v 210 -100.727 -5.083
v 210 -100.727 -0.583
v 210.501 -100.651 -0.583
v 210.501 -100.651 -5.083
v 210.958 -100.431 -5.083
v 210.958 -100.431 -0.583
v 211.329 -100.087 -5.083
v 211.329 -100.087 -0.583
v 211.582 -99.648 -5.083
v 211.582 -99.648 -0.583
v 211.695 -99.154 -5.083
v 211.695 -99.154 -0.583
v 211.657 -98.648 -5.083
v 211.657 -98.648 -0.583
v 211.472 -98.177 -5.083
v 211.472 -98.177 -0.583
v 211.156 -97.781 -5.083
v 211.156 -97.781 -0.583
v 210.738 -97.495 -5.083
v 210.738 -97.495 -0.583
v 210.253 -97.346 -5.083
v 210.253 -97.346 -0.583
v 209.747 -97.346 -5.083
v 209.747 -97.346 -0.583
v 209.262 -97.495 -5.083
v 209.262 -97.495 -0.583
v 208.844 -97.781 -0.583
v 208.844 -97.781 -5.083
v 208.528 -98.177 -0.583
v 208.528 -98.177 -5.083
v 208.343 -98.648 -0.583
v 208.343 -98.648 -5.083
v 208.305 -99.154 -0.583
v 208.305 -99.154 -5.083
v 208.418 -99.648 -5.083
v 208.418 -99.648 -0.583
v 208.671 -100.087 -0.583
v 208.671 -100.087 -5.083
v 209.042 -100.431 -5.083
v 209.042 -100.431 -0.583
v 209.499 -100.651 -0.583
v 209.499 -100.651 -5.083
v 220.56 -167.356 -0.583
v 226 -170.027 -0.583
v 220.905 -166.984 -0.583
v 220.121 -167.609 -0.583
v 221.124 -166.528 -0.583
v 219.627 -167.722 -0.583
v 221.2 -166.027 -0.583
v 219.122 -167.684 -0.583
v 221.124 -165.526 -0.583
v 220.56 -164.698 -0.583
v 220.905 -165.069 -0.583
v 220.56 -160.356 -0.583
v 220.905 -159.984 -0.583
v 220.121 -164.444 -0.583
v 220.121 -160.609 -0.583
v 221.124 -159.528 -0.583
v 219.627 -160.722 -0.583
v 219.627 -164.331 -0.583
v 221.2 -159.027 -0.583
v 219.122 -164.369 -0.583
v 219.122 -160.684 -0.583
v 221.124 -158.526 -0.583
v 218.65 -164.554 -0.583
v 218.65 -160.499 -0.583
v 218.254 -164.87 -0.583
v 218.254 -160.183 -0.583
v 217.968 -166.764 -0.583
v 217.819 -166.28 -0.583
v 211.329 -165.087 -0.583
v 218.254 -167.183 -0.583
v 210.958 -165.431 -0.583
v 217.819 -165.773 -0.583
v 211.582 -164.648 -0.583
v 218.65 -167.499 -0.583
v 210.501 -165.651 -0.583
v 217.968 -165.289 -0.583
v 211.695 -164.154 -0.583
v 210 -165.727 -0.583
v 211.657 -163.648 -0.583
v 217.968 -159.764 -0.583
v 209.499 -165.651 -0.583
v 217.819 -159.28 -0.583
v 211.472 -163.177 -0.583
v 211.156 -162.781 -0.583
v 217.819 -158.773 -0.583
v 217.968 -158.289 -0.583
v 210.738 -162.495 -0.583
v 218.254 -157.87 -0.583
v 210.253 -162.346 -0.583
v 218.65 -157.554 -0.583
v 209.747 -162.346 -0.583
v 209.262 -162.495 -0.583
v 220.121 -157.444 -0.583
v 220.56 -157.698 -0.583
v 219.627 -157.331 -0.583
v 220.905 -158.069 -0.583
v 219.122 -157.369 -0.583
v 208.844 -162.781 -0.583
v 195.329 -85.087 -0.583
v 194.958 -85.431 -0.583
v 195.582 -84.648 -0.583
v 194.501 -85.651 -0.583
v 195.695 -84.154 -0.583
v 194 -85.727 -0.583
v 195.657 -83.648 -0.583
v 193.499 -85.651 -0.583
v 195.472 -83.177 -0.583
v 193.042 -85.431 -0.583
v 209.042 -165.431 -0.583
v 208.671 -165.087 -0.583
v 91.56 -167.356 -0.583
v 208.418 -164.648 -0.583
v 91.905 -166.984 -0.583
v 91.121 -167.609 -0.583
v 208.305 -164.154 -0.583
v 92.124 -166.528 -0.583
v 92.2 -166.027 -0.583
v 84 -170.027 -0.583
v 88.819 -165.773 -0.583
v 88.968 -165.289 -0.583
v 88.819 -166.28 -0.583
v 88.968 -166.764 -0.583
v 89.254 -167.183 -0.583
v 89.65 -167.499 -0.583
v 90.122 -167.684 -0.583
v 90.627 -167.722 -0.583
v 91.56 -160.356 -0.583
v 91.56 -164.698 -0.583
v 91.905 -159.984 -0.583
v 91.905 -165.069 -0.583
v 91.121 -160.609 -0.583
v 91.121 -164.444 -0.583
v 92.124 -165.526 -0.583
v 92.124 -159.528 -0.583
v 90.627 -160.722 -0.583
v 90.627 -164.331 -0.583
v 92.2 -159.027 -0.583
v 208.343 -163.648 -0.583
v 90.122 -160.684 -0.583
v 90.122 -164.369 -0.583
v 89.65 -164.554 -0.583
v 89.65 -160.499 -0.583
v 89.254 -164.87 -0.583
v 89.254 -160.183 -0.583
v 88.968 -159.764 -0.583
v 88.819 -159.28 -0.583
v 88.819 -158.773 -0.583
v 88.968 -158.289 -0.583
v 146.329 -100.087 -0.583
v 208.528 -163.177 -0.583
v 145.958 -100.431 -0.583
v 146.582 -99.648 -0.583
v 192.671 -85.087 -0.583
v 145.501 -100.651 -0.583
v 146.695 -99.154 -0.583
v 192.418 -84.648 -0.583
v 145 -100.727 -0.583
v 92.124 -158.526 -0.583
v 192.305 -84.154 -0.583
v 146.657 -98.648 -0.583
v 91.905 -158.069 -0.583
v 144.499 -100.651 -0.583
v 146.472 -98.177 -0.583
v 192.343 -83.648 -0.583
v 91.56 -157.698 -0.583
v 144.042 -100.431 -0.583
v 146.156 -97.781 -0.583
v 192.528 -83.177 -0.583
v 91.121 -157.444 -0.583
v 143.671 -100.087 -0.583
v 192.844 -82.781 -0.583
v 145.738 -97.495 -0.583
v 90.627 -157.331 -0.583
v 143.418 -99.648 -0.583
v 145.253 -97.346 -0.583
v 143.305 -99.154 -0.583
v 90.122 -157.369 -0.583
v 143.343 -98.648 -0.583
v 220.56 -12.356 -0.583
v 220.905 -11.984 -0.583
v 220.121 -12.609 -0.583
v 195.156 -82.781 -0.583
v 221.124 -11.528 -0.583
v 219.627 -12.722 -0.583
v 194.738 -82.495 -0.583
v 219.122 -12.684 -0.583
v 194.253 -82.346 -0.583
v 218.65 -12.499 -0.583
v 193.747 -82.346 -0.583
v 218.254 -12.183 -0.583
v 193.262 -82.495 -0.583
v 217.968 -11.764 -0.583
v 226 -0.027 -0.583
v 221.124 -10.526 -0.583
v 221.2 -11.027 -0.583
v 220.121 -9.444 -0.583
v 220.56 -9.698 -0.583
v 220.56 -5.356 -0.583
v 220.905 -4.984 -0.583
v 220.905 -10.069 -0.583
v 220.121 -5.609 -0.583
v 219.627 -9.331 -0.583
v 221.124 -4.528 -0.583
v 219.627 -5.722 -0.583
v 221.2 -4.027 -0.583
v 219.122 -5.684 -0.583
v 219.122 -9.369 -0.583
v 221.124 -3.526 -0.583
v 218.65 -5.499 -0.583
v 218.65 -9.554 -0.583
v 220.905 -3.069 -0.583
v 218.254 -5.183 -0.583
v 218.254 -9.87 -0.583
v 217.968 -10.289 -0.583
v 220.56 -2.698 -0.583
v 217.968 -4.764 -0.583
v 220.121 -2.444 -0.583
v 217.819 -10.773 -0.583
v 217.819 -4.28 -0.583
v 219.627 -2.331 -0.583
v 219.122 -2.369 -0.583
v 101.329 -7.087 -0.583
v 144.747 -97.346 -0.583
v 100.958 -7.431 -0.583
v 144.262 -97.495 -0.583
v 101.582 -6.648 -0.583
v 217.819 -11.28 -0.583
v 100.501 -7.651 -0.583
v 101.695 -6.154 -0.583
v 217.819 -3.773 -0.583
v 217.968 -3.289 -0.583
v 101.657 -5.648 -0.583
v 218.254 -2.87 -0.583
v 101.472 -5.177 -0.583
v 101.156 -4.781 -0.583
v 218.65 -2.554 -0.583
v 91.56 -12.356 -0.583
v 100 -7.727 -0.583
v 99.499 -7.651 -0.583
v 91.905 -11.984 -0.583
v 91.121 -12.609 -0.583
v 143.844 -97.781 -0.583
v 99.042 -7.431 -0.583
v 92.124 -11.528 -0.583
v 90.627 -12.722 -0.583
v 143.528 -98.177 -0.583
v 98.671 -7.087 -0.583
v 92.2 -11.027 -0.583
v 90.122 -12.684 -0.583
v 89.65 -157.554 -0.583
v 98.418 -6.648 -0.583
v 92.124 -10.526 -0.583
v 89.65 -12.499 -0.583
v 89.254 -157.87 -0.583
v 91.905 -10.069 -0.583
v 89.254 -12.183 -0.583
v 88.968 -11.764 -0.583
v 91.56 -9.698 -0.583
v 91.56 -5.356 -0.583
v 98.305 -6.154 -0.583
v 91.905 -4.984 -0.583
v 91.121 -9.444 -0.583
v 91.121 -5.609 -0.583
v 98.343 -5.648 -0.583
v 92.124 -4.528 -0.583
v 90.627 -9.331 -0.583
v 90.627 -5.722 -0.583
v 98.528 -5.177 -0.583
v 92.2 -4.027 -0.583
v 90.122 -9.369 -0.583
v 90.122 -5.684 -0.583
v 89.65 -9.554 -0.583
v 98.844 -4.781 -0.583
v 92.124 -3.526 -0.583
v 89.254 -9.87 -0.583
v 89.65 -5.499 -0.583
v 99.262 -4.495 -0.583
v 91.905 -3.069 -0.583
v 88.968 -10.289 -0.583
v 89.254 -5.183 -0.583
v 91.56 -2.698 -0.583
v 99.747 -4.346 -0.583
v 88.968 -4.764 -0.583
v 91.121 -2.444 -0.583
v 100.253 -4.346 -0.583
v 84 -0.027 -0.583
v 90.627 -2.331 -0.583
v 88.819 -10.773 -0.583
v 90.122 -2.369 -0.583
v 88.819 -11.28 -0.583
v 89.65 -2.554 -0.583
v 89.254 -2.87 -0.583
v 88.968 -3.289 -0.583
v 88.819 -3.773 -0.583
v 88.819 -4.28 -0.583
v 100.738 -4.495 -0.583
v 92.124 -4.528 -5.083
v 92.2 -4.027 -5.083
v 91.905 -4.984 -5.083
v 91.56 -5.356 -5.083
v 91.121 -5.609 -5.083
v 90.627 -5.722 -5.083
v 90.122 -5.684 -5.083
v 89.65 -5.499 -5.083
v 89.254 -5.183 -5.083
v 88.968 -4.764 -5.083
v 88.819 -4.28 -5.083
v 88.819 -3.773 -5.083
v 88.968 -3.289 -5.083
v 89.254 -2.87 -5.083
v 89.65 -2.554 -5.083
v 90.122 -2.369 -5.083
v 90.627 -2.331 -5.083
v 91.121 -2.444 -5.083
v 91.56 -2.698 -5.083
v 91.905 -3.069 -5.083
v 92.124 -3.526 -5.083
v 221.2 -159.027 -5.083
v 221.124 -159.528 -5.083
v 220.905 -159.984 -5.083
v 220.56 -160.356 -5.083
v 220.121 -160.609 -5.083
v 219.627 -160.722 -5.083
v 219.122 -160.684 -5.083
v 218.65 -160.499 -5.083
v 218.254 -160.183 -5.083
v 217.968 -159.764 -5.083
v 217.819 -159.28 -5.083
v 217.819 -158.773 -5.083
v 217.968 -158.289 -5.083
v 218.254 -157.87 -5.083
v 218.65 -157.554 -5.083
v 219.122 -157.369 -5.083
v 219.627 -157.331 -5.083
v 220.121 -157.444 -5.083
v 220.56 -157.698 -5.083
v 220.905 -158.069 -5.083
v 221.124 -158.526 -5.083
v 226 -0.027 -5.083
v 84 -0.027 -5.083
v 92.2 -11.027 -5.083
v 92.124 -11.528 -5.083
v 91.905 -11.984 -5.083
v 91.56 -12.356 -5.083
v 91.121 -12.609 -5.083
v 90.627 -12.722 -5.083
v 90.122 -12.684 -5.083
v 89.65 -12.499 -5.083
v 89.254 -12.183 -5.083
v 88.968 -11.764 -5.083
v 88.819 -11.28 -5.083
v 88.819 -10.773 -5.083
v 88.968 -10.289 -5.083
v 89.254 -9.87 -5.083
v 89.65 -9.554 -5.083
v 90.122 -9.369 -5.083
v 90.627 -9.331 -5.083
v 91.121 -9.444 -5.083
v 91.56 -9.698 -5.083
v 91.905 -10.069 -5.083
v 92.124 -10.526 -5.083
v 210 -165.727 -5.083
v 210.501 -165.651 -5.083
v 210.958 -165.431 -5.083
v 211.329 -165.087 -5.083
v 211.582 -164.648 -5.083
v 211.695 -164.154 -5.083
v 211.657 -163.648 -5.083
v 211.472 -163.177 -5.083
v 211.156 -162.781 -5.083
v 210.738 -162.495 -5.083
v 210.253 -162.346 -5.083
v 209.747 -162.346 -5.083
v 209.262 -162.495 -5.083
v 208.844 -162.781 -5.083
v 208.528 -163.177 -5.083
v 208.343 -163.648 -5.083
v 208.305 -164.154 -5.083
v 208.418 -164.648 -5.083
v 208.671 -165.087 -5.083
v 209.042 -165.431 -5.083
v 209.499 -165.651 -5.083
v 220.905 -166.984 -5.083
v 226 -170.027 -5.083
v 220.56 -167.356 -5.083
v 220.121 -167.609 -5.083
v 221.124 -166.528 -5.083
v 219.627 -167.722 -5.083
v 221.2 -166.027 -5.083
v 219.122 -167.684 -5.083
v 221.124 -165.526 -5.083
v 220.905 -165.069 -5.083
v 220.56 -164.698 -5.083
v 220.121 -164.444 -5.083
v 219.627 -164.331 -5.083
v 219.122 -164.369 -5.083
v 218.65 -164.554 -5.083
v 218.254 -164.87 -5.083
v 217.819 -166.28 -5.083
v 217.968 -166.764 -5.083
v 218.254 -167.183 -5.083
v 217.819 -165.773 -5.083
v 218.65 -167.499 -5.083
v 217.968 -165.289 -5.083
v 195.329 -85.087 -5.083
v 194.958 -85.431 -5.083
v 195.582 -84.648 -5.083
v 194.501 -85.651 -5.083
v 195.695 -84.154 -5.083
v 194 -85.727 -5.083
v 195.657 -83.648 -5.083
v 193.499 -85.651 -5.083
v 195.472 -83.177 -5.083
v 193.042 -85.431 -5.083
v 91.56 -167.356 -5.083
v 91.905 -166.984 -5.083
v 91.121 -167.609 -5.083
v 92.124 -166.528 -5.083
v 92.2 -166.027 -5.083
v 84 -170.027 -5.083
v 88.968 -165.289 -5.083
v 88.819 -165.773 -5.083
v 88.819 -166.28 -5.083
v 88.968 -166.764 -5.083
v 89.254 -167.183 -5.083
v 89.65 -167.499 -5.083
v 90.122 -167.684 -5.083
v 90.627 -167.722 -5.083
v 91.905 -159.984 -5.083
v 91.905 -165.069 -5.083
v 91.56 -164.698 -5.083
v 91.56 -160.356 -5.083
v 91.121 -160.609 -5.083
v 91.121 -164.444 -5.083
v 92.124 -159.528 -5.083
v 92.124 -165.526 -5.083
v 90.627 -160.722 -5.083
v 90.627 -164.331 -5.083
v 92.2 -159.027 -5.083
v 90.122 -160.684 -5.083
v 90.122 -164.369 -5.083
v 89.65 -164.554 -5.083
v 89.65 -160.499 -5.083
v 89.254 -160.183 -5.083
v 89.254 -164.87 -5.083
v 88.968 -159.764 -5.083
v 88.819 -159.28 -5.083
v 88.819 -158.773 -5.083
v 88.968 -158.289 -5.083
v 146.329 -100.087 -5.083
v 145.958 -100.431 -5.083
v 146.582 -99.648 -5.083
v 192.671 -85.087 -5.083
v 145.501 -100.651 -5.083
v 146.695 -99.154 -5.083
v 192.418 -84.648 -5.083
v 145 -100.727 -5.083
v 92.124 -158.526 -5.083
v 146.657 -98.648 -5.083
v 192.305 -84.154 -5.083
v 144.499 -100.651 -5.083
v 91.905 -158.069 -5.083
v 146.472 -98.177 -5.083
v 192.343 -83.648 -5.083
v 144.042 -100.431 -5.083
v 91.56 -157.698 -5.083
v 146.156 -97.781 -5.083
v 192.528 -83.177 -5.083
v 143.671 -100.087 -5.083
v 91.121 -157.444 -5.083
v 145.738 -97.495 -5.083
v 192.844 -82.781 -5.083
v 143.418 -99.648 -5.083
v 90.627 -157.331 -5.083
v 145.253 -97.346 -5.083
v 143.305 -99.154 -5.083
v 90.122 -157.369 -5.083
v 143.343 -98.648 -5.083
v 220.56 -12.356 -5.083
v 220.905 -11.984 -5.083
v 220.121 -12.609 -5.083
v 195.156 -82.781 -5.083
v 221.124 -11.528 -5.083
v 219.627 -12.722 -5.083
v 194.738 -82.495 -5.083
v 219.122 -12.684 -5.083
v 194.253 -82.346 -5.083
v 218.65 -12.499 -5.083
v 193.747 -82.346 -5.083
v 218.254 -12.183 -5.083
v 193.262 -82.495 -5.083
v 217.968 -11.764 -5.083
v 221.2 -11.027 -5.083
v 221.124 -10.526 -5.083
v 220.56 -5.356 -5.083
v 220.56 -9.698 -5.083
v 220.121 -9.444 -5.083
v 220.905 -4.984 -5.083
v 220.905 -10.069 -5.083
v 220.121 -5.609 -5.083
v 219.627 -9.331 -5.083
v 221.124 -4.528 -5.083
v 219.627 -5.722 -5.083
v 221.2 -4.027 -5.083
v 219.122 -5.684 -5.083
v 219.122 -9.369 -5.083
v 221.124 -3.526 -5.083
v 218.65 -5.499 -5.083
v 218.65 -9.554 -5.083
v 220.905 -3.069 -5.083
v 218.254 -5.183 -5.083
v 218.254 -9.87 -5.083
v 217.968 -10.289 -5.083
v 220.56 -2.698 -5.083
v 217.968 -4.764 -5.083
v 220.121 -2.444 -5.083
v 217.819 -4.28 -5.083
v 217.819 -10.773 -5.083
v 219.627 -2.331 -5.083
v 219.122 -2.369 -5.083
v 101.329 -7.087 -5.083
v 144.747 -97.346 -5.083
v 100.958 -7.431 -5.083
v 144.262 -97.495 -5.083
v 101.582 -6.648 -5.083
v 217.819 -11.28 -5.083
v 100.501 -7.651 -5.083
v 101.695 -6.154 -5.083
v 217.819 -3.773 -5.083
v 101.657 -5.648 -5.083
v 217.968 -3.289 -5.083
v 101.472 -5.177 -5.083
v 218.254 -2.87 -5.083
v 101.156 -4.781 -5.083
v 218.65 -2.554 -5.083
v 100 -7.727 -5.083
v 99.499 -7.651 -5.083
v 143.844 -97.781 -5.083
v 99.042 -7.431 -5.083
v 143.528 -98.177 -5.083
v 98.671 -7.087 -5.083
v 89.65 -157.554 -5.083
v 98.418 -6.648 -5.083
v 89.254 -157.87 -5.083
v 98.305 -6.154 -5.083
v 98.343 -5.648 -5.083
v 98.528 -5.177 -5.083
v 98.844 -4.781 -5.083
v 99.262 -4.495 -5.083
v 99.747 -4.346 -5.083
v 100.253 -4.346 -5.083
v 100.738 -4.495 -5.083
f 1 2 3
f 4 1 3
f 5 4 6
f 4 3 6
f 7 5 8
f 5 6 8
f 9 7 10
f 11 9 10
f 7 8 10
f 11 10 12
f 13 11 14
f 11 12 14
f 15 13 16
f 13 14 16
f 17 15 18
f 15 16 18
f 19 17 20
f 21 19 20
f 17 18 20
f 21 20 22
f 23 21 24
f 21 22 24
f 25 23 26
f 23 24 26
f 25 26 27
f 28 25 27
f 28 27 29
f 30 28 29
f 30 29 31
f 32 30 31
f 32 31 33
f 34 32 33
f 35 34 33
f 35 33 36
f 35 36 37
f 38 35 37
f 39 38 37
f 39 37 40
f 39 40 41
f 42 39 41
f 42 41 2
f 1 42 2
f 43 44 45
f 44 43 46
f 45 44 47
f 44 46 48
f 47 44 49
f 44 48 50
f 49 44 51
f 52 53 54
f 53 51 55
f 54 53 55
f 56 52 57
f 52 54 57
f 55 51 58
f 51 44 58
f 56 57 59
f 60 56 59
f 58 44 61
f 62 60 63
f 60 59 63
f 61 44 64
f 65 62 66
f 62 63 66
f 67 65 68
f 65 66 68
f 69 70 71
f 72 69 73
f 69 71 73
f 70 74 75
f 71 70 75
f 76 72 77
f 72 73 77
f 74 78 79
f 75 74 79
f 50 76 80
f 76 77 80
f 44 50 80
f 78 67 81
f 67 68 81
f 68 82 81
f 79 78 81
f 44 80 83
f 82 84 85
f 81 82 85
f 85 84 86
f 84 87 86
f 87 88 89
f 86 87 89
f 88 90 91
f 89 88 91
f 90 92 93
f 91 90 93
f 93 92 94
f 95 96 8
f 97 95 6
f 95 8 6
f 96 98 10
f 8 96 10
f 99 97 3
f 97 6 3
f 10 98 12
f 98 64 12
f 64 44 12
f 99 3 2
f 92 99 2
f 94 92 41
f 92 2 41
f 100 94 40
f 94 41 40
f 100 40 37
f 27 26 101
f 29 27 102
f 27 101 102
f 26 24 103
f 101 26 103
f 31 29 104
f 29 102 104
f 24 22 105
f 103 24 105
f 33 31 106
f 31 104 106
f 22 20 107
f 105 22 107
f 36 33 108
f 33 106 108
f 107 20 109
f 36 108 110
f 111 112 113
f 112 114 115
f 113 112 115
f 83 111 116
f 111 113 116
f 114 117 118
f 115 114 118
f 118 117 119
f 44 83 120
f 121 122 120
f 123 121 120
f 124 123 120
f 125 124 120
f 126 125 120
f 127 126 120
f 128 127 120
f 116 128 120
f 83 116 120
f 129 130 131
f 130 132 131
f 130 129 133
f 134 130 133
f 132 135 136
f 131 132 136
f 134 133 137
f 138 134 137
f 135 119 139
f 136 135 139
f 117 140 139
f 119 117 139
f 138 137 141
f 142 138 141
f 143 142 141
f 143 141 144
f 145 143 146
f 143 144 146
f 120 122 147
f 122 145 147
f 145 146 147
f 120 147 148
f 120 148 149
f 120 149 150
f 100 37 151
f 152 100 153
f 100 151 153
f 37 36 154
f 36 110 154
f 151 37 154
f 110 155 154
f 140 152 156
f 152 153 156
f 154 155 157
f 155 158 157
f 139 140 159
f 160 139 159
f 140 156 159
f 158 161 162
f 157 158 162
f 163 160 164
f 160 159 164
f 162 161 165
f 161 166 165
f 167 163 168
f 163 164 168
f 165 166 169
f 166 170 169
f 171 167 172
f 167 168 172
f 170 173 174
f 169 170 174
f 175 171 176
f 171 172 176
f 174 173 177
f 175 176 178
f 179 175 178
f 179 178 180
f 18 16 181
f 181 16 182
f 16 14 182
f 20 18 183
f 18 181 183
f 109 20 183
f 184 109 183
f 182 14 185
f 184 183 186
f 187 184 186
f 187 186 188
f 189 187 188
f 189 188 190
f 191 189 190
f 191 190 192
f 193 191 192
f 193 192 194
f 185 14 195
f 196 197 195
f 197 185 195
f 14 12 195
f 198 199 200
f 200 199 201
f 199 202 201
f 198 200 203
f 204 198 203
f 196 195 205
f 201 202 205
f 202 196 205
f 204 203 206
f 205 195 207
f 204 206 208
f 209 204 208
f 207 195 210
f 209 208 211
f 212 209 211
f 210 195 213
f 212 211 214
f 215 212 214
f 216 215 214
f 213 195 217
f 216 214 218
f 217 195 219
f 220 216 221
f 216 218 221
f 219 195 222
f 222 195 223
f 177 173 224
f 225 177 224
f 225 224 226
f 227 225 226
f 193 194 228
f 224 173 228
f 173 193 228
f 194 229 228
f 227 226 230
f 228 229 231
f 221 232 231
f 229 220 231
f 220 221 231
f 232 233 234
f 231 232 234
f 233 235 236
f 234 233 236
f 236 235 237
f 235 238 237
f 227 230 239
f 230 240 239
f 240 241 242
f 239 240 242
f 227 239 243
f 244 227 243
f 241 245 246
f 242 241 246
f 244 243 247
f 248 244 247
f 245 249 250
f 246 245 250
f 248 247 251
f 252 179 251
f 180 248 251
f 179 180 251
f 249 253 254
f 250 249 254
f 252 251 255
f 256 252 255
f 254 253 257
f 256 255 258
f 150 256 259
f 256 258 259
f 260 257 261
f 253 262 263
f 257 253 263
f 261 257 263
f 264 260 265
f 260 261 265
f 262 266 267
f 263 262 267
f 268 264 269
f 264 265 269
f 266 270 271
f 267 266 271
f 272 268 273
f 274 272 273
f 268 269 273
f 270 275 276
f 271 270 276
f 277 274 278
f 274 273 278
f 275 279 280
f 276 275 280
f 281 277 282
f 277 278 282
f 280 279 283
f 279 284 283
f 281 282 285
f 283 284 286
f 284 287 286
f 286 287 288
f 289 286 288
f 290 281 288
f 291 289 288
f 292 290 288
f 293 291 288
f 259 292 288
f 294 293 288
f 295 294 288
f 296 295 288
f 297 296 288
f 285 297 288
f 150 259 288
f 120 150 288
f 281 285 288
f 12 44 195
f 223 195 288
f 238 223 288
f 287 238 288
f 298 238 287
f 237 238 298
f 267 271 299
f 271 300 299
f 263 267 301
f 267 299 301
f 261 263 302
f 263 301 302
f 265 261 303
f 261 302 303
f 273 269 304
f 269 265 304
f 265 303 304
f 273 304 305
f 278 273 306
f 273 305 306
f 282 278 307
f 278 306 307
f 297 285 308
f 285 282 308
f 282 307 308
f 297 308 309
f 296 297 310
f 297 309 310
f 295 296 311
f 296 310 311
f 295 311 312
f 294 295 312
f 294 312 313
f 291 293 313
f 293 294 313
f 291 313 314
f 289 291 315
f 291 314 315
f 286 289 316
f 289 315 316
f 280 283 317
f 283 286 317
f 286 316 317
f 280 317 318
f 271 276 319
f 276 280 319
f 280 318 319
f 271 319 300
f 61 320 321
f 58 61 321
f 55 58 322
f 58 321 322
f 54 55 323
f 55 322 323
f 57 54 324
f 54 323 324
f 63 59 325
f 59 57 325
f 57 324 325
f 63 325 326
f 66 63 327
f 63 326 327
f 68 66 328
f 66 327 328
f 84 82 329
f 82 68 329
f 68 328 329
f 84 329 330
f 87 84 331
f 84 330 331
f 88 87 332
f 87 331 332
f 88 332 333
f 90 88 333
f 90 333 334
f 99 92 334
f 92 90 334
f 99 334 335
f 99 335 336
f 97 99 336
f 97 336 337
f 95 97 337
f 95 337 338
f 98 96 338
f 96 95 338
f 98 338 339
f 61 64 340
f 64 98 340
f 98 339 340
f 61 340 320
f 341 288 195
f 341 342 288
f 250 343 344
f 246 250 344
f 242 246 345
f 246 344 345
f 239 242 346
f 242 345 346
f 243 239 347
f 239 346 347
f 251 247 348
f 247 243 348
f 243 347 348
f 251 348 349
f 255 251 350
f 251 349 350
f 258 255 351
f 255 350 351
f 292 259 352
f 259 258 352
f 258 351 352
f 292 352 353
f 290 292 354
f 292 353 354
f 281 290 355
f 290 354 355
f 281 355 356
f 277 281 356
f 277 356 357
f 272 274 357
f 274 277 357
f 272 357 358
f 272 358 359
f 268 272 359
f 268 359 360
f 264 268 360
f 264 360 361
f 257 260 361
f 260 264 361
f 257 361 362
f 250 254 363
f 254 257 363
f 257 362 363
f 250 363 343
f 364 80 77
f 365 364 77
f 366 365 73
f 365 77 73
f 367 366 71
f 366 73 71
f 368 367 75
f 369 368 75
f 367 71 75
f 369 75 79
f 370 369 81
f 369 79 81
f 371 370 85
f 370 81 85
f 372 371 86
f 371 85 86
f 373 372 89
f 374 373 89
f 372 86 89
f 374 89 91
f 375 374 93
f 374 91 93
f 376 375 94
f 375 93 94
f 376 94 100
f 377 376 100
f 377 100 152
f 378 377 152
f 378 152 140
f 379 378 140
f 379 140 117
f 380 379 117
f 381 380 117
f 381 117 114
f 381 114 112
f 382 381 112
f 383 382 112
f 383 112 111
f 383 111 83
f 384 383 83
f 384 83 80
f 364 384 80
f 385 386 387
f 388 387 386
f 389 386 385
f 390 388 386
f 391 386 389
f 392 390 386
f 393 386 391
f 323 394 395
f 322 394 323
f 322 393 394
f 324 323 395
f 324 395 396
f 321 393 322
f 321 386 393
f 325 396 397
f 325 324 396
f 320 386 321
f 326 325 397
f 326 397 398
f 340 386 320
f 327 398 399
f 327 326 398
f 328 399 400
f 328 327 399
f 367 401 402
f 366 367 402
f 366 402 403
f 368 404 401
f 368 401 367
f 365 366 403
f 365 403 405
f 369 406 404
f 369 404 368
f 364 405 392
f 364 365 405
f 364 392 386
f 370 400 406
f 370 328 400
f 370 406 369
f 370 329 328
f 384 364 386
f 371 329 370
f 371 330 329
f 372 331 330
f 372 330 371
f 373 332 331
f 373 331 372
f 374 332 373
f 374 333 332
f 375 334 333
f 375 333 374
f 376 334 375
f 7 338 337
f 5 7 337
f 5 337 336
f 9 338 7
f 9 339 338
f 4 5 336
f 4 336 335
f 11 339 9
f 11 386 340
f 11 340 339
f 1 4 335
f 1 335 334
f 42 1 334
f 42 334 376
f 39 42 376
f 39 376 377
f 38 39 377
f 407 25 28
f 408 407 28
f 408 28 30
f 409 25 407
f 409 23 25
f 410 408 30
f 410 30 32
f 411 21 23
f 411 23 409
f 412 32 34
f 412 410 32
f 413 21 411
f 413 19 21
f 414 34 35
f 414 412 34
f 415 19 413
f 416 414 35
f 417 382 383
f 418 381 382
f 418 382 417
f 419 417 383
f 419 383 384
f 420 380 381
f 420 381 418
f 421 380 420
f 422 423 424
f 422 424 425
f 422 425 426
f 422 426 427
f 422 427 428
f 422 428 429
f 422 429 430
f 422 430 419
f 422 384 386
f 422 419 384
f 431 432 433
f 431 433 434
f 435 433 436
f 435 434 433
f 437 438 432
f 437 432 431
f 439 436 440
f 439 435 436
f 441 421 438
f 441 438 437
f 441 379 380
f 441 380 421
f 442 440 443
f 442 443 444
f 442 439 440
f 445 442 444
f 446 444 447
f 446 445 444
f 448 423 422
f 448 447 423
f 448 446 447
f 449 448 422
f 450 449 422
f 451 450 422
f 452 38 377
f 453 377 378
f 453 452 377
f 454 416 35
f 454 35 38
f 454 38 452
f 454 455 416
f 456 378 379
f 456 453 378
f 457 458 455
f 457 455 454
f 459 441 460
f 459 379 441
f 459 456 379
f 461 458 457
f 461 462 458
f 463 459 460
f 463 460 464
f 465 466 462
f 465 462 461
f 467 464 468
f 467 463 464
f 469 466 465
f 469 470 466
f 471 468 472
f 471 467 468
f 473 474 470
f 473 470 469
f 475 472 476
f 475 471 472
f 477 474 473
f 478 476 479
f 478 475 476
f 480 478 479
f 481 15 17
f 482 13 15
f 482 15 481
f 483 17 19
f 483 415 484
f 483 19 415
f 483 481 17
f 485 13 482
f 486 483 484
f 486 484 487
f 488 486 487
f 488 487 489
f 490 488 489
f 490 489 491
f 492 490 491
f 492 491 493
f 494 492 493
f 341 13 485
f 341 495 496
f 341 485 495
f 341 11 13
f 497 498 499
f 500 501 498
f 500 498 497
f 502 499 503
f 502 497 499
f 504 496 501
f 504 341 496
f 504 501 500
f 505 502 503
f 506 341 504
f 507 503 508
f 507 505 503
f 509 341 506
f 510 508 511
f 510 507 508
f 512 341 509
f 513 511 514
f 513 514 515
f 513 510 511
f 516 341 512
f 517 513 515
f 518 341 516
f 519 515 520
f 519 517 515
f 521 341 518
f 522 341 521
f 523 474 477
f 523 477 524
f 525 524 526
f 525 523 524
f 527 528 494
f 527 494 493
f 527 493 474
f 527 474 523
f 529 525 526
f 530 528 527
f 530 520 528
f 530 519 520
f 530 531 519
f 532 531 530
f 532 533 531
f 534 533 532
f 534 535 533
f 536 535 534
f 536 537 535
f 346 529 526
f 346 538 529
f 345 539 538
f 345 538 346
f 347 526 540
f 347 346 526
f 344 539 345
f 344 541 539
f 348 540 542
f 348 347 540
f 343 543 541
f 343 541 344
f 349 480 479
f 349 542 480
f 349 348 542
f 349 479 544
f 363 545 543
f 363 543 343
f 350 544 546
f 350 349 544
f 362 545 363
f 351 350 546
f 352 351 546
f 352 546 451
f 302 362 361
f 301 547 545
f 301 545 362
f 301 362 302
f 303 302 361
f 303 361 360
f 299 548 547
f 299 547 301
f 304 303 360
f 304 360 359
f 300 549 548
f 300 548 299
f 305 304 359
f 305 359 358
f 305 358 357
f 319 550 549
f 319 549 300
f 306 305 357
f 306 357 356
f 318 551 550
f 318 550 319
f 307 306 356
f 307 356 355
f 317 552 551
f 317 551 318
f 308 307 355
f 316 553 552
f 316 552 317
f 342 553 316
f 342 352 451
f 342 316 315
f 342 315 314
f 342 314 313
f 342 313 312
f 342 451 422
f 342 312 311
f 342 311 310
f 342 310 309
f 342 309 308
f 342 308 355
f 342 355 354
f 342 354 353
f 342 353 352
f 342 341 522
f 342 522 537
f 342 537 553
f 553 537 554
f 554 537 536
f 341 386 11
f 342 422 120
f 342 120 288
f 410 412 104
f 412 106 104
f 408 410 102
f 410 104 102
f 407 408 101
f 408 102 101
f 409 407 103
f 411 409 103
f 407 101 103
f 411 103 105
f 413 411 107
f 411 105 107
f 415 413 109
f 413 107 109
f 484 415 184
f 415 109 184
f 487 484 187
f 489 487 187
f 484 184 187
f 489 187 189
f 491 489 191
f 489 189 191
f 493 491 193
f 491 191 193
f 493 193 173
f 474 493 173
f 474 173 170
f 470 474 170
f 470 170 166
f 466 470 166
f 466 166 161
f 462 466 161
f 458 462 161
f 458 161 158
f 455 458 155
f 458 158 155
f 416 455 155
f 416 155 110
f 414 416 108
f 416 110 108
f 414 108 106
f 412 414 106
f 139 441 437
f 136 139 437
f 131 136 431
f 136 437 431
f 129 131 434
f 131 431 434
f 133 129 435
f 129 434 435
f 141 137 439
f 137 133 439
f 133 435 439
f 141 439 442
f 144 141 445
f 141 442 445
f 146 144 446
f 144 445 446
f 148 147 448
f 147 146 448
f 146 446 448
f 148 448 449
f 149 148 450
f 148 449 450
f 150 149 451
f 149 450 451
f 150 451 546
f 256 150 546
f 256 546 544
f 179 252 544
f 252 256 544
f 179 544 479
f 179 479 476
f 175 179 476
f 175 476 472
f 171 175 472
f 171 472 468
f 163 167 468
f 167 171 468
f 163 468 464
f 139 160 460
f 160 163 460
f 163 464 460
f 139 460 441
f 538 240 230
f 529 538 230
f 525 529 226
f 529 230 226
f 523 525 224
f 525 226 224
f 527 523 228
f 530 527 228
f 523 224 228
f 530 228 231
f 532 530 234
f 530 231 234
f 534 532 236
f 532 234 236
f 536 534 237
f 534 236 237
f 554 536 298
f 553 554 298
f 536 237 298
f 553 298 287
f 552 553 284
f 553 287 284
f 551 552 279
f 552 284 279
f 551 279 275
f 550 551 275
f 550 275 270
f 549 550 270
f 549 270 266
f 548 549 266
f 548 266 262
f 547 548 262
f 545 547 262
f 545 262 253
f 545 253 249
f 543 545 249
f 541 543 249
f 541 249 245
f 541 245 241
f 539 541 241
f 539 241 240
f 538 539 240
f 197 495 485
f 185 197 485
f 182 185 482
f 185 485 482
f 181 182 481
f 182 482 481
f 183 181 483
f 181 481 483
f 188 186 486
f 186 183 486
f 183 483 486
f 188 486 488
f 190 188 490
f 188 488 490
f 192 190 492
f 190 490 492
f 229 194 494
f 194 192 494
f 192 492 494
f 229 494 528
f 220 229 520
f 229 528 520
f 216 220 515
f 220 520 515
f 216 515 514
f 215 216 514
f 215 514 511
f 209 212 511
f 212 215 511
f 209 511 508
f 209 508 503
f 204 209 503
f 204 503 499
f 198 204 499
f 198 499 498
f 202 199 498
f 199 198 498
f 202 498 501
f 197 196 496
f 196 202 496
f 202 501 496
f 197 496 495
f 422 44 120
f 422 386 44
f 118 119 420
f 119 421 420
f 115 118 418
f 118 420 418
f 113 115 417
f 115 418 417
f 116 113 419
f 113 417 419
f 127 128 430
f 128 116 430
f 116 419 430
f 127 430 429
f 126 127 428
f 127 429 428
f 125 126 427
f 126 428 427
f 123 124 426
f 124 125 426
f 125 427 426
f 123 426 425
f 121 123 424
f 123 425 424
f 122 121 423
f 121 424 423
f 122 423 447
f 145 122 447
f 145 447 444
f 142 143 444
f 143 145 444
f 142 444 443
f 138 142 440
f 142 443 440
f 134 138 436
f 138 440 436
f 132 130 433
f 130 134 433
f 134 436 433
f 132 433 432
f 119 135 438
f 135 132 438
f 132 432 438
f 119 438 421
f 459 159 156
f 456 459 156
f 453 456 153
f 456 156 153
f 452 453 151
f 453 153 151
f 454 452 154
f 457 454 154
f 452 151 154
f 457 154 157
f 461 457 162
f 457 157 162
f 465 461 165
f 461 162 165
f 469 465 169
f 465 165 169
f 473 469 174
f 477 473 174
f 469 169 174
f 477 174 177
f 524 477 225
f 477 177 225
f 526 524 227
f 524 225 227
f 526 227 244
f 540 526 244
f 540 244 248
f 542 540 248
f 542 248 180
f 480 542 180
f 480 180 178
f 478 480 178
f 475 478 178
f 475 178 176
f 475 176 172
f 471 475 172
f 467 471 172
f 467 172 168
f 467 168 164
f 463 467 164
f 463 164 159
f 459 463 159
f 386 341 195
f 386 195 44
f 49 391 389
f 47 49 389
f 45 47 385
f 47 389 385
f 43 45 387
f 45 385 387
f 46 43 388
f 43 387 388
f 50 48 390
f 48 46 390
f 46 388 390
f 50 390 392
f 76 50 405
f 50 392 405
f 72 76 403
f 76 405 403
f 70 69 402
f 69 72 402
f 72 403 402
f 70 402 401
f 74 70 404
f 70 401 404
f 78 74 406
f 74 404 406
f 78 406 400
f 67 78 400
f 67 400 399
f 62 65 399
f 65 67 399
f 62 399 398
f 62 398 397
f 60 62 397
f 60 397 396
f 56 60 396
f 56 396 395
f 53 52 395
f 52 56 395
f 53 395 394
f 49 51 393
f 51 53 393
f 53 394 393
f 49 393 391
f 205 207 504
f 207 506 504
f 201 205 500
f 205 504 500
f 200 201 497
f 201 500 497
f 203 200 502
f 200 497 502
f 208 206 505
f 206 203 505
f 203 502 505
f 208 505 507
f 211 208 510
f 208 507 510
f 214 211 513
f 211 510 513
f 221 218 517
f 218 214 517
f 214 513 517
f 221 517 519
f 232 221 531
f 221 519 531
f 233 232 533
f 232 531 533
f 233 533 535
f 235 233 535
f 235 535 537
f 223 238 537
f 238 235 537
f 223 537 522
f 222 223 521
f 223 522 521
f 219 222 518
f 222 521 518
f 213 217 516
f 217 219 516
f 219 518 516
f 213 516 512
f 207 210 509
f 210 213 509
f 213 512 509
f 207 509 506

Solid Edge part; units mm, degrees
sketch "Sketch1" plane through (0, 0, -5.0832) normal (0, 0, 1) x (1, 0, 0)
  circle A0 centre (219.5, -4.0267) radius 1.7
  circle A1 centre (219.5, -11.0267) radius 1.7
  circle A2 centre (90.5, -4.0267) radius 1.7
  circle A3 centre (90.5, -11.0267) radius 1.7
  circle A4 centre (90.5, -166.0267) radius 1.7
  circle A5 centre (90.5, -159.0267) radius 1.7
  circle A6 centre (219.5, -166.0267) radius 1.7
  circle A7 centre (219.5, -159.0267) radius 1.7
  line L0 (84, -0.0267) -> (226, -0.0267)
  line L1 (226, -0.0267) -> (226, -170.0267)
  line L2 (226, -170.0267) -> (84, -170.0267)
  line L3 (84, -170.0267) -> (84, -0.0267)
  dimension "D1" = 142
  dimension "D2" = 170
extrude "ExtrudedProtrusion_1" add sketch "Sketch1" along normal blind 4.5
sketch "Sketch2" plane through (-67, -90, -0.5832) normal (0, 0, 1) x (0, -1, 0)
  circle A0 centre (-5.9733, 261) radius 1.7
  circle A1 centre (9.0267, 277) radius 1.7
  circle A2 centre (9.0267, 212) radius 1.7
  circle A3 centre (-83.9733, 167) radius 1.7
  circle A4 centre (74.0267, 277) radius 1.7
extrude "Cutout1" cut sketch "Sketch2" against normal through all
properties material "Steel"
